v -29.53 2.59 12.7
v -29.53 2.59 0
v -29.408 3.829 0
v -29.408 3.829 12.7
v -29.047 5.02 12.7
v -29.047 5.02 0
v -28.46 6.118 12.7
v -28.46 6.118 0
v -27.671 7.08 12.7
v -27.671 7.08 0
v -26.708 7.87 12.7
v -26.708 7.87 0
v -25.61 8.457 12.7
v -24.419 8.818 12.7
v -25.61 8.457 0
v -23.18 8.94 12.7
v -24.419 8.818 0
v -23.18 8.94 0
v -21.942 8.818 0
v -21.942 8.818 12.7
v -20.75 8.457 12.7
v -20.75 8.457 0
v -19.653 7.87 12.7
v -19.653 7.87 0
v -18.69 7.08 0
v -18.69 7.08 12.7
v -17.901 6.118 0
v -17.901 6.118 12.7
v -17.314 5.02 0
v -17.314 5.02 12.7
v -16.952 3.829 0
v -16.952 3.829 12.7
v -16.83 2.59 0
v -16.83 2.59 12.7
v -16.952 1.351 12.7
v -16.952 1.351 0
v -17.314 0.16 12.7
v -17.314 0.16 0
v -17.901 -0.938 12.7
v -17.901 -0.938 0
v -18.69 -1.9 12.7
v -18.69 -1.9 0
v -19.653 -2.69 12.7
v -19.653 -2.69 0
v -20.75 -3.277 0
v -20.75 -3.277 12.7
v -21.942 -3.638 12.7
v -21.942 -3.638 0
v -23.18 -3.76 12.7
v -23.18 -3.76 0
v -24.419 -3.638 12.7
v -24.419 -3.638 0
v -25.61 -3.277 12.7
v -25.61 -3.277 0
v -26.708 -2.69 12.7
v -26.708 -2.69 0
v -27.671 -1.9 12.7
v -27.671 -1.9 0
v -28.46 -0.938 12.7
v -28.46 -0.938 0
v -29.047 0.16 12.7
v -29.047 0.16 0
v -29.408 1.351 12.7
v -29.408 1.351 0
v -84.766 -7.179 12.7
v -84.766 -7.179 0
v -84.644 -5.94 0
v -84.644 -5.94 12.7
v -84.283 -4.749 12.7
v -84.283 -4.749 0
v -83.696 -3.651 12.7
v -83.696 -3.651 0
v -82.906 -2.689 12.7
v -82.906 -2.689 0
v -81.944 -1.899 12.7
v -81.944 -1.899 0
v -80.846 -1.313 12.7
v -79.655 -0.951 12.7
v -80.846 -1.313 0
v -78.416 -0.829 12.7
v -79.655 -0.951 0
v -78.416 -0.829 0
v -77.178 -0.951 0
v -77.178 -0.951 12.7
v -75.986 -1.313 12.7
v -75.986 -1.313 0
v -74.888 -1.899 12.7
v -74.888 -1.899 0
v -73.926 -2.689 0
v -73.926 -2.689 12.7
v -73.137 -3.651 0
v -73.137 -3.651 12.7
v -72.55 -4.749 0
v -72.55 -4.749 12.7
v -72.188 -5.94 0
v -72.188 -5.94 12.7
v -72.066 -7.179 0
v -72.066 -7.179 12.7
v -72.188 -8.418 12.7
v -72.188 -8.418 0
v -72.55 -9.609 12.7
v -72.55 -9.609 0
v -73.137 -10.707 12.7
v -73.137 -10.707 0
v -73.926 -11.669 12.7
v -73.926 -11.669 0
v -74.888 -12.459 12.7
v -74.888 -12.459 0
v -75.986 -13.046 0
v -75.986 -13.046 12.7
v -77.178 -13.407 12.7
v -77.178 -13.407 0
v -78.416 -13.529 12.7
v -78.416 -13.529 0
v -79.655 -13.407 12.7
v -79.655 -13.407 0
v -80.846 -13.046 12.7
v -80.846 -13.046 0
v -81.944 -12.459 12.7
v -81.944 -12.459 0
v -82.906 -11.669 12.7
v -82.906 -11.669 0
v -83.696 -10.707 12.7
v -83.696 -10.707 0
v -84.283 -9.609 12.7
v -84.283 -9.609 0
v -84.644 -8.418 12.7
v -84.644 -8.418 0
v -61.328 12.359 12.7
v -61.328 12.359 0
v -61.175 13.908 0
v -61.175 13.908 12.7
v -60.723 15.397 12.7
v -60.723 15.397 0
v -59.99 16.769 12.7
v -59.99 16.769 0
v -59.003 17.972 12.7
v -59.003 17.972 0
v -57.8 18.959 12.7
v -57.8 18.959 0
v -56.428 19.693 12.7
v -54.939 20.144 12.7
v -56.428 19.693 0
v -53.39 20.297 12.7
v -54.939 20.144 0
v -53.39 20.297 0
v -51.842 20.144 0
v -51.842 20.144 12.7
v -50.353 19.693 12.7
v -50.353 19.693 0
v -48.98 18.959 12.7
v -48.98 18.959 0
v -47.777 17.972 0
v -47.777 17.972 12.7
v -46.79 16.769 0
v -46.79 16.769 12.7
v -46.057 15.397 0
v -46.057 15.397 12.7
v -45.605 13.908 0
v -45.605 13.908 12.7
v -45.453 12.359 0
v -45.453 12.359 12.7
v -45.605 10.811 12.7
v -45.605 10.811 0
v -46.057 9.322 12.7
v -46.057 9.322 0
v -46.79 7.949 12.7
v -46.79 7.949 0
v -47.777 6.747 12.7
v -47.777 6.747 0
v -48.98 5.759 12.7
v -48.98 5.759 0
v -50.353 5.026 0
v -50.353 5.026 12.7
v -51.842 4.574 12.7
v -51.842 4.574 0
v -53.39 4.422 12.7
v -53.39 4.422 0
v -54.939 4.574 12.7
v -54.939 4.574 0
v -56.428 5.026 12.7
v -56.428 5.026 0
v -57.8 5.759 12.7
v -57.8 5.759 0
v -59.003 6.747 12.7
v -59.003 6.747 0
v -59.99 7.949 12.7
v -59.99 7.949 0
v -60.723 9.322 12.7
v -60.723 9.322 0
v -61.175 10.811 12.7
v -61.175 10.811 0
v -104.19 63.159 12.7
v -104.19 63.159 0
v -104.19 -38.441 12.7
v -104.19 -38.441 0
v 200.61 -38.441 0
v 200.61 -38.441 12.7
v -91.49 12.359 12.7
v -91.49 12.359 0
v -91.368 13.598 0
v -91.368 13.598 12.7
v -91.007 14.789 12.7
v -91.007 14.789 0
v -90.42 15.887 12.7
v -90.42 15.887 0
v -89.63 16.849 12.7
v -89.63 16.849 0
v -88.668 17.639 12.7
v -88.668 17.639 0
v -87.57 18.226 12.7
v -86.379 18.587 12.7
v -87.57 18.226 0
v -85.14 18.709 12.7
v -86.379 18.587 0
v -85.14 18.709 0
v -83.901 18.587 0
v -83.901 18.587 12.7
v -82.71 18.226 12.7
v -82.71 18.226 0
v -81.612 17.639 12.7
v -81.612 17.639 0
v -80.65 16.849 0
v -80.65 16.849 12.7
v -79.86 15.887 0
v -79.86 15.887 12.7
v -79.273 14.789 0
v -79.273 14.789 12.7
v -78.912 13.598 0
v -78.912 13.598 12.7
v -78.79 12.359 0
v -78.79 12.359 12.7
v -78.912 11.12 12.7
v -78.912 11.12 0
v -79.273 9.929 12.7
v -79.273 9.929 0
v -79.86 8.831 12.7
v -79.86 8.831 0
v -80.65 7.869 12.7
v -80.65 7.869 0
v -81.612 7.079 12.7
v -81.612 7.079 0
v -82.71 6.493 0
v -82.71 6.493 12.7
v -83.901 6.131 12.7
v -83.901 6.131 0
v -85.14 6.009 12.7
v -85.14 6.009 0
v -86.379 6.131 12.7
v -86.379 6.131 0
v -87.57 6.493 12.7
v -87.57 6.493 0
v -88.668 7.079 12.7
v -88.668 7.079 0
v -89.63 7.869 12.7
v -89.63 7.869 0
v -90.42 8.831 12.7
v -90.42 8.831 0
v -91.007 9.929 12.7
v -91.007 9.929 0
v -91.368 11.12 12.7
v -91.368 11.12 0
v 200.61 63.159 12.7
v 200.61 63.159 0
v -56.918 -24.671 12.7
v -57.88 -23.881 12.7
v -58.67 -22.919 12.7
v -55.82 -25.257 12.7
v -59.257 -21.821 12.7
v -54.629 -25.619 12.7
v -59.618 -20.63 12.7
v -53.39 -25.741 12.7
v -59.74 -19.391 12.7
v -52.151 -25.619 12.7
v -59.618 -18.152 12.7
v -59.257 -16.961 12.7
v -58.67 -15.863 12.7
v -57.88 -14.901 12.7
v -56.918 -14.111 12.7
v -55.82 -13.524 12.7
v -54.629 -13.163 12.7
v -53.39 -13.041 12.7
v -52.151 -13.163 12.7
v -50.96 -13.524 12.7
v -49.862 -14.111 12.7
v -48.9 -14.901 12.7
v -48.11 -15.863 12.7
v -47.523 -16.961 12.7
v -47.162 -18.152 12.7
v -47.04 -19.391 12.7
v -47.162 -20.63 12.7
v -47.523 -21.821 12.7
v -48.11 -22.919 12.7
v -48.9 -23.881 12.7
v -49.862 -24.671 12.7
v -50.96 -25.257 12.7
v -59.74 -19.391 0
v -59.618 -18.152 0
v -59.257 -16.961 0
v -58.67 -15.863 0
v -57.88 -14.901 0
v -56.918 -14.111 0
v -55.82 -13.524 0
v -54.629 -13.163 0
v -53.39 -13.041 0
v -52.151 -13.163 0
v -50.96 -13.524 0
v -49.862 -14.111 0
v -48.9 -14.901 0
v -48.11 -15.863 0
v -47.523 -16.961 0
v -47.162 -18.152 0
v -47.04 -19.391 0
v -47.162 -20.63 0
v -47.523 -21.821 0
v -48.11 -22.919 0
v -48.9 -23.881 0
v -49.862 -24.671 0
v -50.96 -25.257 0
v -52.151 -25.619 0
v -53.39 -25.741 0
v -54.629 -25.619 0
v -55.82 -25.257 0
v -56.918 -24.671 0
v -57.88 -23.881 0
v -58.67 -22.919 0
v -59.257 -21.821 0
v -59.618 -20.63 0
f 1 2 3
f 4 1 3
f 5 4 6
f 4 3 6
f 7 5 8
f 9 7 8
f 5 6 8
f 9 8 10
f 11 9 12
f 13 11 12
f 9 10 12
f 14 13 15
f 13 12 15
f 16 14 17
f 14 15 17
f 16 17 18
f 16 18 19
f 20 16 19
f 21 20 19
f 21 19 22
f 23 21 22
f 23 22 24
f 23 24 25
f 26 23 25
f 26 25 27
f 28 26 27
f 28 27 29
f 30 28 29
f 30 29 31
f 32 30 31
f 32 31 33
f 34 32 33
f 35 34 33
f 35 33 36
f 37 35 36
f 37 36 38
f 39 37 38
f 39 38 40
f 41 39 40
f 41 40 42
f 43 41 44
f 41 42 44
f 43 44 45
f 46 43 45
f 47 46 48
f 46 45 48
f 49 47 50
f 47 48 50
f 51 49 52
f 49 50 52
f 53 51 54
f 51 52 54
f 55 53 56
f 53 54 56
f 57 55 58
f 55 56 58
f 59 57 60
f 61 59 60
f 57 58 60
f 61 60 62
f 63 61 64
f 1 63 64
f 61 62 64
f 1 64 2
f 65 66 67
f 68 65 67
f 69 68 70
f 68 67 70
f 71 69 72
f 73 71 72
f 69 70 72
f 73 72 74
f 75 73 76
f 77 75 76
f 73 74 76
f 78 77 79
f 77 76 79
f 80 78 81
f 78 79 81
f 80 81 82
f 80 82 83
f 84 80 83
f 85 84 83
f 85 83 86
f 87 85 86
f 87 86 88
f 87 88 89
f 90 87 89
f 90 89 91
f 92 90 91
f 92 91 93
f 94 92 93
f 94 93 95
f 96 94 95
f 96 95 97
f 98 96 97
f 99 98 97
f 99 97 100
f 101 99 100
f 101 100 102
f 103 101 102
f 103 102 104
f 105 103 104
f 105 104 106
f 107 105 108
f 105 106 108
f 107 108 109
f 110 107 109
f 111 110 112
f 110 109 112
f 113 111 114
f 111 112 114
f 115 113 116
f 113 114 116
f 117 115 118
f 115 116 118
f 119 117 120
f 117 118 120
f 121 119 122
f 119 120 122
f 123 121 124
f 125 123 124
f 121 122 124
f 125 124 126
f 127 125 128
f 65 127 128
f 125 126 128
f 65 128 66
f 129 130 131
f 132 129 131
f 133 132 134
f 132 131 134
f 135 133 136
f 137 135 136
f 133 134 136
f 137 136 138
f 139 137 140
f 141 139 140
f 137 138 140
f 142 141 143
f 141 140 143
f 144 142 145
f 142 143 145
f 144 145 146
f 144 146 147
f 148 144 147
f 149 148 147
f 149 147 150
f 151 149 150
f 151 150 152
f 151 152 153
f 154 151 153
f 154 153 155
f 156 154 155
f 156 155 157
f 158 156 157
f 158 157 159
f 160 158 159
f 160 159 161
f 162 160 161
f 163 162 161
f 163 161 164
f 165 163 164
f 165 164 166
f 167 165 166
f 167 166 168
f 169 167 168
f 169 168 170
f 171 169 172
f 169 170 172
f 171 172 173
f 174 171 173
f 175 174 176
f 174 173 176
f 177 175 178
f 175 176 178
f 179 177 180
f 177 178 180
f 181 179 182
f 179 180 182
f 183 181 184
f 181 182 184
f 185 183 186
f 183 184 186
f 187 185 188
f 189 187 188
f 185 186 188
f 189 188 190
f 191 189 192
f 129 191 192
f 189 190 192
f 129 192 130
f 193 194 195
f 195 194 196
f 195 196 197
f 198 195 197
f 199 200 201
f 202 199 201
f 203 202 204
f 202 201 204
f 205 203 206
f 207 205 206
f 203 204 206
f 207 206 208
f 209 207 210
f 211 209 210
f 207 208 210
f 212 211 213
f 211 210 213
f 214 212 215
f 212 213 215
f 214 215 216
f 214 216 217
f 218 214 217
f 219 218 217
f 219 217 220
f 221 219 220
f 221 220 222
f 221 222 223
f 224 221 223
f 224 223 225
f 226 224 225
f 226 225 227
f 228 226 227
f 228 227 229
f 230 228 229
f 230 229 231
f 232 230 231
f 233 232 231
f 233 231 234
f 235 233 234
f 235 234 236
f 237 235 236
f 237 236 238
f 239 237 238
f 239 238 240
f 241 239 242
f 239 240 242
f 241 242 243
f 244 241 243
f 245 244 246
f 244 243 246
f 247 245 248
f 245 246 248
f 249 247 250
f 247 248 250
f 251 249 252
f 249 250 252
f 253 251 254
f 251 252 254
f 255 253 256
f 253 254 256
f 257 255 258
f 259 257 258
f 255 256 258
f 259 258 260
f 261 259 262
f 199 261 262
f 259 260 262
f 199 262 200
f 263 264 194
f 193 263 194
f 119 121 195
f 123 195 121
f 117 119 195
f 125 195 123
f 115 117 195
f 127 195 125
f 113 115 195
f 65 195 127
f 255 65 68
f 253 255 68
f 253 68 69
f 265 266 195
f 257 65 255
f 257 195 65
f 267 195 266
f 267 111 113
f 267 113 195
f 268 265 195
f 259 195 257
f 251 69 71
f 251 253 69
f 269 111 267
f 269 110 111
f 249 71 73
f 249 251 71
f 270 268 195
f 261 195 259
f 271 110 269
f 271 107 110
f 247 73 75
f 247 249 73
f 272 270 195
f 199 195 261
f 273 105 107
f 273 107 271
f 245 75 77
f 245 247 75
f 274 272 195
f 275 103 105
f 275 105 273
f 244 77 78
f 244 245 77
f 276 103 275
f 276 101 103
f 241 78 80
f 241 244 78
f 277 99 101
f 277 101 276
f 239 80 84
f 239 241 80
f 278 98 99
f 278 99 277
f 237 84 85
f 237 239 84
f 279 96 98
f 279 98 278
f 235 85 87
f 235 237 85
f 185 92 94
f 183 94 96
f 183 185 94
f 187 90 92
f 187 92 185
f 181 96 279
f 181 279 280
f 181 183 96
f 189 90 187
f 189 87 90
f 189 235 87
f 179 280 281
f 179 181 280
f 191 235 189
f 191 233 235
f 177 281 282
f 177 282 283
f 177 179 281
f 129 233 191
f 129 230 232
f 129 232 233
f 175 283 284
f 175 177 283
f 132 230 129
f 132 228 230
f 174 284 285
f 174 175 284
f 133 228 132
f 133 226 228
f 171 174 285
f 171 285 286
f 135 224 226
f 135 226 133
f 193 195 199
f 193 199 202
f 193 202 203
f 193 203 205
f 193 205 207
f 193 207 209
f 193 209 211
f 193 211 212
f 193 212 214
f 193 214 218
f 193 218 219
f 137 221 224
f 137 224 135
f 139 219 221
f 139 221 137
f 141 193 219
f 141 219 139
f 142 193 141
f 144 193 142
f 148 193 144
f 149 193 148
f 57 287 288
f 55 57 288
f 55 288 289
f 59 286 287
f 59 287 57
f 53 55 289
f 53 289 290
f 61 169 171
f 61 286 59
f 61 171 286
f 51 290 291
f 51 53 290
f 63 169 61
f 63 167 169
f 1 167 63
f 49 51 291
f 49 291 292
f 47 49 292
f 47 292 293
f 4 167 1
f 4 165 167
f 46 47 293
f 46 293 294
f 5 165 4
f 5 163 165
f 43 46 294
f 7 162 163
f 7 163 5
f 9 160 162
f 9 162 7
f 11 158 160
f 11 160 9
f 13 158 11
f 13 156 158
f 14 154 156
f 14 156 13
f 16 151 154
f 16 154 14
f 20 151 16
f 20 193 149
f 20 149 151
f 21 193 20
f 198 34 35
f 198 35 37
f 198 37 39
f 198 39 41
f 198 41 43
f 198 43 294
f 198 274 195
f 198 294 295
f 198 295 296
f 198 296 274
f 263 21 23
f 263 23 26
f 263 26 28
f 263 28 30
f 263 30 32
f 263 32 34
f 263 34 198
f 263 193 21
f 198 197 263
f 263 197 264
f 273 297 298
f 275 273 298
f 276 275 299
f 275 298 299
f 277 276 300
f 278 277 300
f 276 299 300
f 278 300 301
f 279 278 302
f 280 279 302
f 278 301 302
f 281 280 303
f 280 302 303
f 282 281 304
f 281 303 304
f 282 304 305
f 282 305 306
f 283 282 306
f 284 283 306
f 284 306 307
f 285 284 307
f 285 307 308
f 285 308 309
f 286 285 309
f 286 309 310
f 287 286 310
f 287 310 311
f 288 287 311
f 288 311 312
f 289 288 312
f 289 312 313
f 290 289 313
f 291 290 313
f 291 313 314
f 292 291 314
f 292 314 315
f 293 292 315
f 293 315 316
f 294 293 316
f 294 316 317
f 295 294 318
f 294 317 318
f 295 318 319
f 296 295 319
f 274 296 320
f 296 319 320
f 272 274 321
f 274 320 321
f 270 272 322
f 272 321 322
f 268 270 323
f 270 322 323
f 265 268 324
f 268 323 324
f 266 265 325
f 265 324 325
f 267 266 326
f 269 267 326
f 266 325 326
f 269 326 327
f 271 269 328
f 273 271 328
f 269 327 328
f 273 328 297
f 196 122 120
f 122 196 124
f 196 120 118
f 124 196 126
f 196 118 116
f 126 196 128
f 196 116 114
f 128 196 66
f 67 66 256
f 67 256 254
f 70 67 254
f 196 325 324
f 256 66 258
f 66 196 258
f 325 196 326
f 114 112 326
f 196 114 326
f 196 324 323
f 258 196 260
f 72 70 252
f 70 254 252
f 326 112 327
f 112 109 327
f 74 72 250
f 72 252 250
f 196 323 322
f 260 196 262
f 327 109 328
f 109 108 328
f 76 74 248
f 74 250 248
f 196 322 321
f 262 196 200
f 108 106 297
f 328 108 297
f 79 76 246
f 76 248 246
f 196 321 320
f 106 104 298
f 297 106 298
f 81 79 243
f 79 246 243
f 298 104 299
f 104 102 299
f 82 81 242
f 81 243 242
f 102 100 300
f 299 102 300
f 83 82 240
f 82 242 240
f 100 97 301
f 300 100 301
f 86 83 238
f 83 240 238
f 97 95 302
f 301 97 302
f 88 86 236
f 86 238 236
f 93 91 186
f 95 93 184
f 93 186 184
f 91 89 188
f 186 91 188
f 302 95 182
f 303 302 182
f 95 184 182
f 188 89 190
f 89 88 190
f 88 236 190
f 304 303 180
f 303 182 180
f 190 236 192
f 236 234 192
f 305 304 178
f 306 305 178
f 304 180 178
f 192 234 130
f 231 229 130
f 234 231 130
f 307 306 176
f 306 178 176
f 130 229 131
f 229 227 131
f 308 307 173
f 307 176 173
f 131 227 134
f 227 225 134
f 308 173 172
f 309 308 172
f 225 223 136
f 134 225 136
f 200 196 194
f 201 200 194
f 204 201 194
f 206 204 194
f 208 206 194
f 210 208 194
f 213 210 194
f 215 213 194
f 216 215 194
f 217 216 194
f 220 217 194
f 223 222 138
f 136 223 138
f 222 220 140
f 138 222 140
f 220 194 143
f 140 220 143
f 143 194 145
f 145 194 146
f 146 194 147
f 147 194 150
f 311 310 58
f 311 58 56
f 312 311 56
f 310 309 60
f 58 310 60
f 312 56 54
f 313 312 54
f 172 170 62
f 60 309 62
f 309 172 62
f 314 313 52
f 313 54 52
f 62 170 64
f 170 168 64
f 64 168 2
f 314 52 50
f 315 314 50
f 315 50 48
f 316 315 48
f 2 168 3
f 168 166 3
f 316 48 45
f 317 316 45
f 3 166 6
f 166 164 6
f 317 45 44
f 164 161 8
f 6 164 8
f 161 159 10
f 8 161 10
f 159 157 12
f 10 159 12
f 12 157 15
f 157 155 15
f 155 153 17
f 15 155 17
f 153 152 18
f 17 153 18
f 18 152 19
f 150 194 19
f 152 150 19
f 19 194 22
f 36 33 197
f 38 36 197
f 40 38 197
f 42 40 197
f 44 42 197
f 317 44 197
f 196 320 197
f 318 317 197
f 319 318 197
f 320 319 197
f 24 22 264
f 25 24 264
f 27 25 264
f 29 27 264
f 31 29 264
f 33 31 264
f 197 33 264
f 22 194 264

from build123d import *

# Parameters (mm, degrees)
F0_R     = 1.27
F1_DEPTH = 12.7
F3_D     = 15.875
F6_D     = 12.7
F8_D     = 12.7


# Not quite as in the source:
# - a feature names something its author has since deleted; it is built from what else it names


with BuildPart() as f1:
    # F0 (on Top) → F1 (new body)
    with BuildSketch(Plane.XY):
        Polygon((200.6098739386, 63.1592117809), (-2.5901260614, 63.1592117809), (-104.1901260614, 63.1592117809), (-104.1901260614, -38.4407882191), (-2.5901260614, -38.4407882191), (200.6098739386, -38.4407882191), align=None)
        with Locations((-53.3901260614, -19.3907882191)):
            Circle(F0_R, mode=Mode.SUBTRACT)
        with Locations((-78.4163327398, -7.1792497576)):
            Circle(F0_R, mode=Mode.SUBTRACT)
        with Locations((-53.3901260614, 12.3592117809)):
            Circle(F0_R, mode=Mode.SUBTRACT)
        with Locations((-23.1804483045, 2.5899810116)):
            Circle(F0_R, mode=Mode.SUBTRACT)
        with Locations((-85.1401260614, 12.3592117809)):
            Circle(F0_R, mode=Mode.SUBTRACT)
        with Locations((-92.6627071454, 25.0592117809)):
            Circle(F0_R, mode=Mode.SUBTRACT)
        with Locations((-12.1151260614, 12.3592117809)):
            Circle(F0_R, mode=Mode.SUBTRACT)
        with Locations((-20.8560573795, 37.7592117809)):
            Circle(F0_R, mode=Mode.SUBTRACT)
        with Locations((-53.3901260614, 53.6342117809)):
            Circle(F0_R, mode=Mode.SUBTRACT)
        with Locations((-92.6627071454, 25.0592117809)):
            Circle(F0_R)
        with Locations((-53.3901260614, 53.6342117809)):
            Circle(F0_R)
        with Locations((-20.8560573795, 37.7592117809)):
            Circle(F0_R)
        with Locations((-12.1151260614, 12.3592117809)):
            Circle(F0_R)
    extrude(amount=F1_DEPTH)

    # F3 (through all)
    with Locations(Plane.XY.offset(12.7)):
        with Locations((-53.3901260614, 12.3592117809)):
            Hole(F3_D / 2)

    # F6 (through all)
    with Locations(Plane.XY.offset(12.7)):
        with Locations((-53.3901260614, -19.3907882191)):
            Hole(F6_D / 2)

    # F8 (through all)
    with Locations(Plane.XY.offset(12.7)):
        with Locations((-85.1401260614, 12.3592117809), (-78.4163327398, -7.1792497576), (-23.1804483045, 2.5899810116)):
            Hole(F8_D / 2)


solid = f1.part
